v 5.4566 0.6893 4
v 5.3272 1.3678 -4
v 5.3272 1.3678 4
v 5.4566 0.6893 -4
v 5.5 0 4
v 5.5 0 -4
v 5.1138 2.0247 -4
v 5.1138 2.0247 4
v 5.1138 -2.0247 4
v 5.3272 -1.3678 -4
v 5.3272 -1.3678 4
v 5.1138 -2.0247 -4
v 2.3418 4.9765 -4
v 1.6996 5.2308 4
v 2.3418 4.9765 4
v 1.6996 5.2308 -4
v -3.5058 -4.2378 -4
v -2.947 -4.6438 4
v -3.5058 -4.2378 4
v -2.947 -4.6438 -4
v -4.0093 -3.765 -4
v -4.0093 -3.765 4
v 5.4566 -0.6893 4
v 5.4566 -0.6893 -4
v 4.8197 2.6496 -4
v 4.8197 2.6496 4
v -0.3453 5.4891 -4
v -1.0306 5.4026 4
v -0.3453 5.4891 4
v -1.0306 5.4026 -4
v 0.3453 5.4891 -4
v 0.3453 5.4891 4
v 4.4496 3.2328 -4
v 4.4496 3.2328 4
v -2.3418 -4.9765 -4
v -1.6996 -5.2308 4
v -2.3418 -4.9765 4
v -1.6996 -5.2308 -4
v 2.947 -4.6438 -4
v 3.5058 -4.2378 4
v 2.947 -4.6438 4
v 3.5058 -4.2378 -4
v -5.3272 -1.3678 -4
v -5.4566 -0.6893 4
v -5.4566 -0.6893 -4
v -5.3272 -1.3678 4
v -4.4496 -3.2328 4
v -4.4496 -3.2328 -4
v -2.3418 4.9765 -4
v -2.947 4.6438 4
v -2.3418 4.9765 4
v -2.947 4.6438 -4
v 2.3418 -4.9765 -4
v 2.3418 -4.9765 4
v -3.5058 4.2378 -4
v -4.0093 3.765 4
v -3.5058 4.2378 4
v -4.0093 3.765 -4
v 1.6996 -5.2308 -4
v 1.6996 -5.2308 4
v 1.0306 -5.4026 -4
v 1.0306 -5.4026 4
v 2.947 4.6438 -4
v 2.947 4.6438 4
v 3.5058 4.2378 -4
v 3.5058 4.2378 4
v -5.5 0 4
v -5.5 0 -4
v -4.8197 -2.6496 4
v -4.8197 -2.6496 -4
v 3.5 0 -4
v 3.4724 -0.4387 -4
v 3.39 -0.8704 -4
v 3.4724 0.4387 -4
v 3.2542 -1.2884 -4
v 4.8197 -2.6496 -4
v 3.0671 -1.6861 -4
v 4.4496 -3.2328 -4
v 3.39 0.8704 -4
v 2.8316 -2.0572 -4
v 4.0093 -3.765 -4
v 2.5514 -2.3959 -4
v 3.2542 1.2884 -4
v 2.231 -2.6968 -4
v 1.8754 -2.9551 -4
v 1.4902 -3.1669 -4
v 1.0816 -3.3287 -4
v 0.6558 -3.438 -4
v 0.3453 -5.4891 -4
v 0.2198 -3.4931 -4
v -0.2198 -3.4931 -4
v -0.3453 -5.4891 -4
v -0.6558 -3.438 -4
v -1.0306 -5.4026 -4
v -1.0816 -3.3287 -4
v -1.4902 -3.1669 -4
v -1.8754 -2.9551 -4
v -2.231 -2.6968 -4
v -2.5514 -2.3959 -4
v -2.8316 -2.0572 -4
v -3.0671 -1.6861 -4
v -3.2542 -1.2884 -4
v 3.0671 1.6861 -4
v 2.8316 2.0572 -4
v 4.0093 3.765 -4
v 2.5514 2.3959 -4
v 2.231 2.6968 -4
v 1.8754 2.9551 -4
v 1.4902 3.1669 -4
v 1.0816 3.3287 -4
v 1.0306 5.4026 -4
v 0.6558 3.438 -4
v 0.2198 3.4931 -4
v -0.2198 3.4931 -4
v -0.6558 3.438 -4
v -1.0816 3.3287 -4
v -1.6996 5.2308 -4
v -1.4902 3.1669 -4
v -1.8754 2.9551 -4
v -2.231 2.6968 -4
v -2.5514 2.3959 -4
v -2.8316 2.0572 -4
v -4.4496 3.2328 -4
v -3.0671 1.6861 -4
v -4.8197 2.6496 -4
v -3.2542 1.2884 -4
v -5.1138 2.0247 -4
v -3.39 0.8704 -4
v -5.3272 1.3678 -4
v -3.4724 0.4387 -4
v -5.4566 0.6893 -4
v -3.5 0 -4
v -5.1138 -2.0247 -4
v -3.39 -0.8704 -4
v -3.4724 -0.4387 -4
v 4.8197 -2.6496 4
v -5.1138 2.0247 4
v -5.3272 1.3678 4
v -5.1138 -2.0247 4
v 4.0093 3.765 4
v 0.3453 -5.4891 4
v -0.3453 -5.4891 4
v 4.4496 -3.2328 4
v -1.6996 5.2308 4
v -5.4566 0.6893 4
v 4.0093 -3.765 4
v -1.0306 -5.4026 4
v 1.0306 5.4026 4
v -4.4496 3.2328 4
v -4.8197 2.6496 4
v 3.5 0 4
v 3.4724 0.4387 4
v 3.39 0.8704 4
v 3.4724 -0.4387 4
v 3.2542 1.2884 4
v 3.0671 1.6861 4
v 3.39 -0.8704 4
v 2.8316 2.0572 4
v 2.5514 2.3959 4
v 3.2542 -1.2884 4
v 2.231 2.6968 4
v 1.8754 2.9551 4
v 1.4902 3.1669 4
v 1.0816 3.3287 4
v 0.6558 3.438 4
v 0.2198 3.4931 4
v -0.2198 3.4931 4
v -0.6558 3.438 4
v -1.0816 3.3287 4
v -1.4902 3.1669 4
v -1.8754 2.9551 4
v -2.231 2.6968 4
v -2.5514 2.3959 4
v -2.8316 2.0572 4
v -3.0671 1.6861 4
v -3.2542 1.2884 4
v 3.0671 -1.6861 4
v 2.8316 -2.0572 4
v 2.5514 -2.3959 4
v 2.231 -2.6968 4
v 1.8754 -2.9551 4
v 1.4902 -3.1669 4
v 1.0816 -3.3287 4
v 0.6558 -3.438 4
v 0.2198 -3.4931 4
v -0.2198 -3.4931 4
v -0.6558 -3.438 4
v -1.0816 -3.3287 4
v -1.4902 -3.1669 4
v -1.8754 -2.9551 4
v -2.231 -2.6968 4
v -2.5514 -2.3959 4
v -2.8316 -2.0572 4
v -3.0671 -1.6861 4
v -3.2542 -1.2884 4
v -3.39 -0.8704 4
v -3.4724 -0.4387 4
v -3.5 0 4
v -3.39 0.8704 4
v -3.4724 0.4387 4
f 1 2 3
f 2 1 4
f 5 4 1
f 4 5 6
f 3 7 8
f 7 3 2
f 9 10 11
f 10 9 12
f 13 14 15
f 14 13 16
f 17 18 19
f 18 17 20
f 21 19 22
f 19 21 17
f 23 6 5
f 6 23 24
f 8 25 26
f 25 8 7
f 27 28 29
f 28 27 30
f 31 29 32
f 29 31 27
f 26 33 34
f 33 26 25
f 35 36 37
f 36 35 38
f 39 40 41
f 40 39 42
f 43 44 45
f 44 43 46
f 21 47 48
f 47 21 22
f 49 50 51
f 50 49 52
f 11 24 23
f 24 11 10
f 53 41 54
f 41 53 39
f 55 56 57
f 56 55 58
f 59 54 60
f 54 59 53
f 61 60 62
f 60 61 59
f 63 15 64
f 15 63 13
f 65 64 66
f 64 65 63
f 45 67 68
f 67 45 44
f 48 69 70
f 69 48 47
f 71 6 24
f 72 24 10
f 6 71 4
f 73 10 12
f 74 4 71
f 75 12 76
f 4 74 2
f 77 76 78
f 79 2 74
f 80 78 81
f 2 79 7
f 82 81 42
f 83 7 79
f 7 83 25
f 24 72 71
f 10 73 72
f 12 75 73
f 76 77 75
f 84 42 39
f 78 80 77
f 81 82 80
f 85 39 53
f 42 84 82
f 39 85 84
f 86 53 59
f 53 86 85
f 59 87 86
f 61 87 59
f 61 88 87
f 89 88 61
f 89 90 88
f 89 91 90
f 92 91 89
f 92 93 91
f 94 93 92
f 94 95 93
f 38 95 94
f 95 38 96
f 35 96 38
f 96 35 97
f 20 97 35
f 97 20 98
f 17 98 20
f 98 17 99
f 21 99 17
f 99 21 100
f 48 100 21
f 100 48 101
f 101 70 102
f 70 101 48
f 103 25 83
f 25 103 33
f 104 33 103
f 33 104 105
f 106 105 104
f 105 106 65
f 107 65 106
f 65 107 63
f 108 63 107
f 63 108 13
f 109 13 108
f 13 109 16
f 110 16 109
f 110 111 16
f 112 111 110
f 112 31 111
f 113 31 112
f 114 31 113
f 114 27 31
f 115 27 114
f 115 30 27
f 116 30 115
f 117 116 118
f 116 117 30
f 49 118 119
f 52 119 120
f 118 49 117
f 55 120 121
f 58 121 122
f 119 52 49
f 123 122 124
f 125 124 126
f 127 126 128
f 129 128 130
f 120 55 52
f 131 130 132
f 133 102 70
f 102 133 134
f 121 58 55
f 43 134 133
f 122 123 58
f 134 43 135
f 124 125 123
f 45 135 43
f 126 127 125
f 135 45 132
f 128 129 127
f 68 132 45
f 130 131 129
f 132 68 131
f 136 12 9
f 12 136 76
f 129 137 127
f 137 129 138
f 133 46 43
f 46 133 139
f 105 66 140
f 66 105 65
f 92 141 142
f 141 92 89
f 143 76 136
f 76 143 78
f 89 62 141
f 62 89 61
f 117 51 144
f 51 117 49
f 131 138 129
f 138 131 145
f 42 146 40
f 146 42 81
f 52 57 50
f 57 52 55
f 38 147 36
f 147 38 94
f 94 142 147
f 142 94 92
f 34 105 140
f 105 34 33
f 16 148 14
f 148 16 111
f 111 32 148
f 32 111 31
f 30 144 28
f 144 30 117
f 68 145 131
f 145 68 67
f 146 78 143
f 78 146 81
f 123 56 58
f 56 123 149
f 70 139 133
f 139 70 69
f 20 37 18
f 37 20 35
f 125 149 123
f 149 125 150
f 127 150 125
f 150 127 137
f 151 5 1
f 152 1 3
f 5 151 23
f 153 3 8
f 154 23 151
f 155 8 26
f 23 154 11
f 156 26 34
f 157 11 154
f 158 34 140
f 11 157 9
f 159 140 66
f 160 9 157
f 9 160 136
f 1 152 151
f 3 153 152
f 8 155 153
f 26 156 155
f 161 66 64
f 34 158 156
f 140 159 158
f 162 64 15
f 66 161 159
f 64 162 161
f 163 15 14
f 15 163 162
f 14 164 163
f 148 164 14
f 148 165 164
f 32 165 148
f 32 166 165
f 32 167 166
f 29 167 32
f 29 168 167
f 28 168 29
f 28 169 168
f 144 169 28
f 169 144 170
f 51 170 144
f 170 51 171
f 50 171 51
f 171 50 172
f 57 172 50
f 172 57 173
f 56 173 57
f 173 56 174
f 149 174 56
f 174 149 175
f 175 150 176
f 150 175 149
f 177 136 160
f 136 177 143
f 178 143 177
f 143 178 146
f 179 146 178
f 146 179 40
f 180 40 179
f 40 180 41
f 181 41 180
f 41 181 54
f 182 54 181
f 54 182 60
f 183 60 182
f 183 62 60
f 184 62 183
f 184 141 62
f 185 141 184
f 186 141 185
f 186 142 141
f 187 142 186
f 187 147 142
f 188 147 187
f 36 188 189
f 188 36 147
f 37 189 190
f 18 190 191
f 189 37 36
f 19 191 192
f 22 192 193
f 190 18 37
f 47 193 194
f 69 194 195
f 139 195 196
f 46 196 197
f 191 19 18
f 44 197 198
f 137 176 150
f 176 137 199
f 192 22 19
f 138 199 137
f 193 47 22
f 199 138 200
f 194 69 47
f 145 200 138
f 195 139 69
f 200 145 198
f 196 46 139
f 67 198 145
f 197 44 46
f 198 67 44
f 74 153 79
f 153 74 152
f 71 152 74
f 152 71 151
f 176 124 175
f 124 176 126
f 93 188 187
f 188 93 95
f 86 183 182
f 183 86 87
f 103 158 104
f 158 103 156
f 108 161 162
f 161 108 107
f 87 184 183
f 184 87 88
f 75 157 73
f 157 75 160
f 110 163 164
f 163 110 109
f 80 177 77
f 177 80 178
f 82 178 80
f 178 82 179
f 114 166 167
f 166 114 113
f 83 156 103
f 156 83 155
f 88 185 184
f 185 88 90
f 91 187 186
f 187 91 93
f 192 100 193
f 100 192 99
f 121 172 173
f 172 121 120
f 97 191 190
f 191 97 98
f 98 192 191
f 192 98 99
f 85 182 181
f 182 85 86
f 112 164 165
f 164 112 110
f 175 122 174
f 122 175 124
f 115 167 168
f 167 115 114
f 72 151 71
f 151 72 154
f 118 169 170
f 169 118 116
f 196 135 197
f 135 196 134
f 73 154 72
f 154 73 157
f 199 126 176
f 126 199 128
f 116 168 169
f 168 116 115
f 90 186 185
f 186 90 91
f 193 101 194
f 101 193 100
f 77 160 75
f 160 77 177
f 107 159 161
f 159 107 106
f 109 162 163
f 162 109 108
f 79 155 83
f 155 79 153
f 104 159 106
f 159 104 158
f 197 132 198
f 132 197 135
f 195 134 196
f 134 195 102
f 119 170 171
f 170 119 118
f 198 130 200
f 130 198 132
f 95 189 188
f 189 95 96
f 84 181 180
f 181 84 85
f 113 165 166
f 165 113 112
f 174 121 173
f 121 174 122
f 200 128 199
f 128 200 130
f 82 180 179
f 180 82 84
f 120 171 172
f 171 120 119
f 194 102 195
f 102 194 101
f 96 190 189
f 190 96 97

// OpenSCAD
$fn = 50;


difference() {
	union() {
		translate(v = [0, 0, -4.0000000000]) {
			cylinder(h = 8, r = 5.5000000000);
		}
	}
	union() {
		translate(v = [0, 0, -100.0000000000]) {
			cylinder(h = 200, r = 3.5000000000);
		}
	}
}
